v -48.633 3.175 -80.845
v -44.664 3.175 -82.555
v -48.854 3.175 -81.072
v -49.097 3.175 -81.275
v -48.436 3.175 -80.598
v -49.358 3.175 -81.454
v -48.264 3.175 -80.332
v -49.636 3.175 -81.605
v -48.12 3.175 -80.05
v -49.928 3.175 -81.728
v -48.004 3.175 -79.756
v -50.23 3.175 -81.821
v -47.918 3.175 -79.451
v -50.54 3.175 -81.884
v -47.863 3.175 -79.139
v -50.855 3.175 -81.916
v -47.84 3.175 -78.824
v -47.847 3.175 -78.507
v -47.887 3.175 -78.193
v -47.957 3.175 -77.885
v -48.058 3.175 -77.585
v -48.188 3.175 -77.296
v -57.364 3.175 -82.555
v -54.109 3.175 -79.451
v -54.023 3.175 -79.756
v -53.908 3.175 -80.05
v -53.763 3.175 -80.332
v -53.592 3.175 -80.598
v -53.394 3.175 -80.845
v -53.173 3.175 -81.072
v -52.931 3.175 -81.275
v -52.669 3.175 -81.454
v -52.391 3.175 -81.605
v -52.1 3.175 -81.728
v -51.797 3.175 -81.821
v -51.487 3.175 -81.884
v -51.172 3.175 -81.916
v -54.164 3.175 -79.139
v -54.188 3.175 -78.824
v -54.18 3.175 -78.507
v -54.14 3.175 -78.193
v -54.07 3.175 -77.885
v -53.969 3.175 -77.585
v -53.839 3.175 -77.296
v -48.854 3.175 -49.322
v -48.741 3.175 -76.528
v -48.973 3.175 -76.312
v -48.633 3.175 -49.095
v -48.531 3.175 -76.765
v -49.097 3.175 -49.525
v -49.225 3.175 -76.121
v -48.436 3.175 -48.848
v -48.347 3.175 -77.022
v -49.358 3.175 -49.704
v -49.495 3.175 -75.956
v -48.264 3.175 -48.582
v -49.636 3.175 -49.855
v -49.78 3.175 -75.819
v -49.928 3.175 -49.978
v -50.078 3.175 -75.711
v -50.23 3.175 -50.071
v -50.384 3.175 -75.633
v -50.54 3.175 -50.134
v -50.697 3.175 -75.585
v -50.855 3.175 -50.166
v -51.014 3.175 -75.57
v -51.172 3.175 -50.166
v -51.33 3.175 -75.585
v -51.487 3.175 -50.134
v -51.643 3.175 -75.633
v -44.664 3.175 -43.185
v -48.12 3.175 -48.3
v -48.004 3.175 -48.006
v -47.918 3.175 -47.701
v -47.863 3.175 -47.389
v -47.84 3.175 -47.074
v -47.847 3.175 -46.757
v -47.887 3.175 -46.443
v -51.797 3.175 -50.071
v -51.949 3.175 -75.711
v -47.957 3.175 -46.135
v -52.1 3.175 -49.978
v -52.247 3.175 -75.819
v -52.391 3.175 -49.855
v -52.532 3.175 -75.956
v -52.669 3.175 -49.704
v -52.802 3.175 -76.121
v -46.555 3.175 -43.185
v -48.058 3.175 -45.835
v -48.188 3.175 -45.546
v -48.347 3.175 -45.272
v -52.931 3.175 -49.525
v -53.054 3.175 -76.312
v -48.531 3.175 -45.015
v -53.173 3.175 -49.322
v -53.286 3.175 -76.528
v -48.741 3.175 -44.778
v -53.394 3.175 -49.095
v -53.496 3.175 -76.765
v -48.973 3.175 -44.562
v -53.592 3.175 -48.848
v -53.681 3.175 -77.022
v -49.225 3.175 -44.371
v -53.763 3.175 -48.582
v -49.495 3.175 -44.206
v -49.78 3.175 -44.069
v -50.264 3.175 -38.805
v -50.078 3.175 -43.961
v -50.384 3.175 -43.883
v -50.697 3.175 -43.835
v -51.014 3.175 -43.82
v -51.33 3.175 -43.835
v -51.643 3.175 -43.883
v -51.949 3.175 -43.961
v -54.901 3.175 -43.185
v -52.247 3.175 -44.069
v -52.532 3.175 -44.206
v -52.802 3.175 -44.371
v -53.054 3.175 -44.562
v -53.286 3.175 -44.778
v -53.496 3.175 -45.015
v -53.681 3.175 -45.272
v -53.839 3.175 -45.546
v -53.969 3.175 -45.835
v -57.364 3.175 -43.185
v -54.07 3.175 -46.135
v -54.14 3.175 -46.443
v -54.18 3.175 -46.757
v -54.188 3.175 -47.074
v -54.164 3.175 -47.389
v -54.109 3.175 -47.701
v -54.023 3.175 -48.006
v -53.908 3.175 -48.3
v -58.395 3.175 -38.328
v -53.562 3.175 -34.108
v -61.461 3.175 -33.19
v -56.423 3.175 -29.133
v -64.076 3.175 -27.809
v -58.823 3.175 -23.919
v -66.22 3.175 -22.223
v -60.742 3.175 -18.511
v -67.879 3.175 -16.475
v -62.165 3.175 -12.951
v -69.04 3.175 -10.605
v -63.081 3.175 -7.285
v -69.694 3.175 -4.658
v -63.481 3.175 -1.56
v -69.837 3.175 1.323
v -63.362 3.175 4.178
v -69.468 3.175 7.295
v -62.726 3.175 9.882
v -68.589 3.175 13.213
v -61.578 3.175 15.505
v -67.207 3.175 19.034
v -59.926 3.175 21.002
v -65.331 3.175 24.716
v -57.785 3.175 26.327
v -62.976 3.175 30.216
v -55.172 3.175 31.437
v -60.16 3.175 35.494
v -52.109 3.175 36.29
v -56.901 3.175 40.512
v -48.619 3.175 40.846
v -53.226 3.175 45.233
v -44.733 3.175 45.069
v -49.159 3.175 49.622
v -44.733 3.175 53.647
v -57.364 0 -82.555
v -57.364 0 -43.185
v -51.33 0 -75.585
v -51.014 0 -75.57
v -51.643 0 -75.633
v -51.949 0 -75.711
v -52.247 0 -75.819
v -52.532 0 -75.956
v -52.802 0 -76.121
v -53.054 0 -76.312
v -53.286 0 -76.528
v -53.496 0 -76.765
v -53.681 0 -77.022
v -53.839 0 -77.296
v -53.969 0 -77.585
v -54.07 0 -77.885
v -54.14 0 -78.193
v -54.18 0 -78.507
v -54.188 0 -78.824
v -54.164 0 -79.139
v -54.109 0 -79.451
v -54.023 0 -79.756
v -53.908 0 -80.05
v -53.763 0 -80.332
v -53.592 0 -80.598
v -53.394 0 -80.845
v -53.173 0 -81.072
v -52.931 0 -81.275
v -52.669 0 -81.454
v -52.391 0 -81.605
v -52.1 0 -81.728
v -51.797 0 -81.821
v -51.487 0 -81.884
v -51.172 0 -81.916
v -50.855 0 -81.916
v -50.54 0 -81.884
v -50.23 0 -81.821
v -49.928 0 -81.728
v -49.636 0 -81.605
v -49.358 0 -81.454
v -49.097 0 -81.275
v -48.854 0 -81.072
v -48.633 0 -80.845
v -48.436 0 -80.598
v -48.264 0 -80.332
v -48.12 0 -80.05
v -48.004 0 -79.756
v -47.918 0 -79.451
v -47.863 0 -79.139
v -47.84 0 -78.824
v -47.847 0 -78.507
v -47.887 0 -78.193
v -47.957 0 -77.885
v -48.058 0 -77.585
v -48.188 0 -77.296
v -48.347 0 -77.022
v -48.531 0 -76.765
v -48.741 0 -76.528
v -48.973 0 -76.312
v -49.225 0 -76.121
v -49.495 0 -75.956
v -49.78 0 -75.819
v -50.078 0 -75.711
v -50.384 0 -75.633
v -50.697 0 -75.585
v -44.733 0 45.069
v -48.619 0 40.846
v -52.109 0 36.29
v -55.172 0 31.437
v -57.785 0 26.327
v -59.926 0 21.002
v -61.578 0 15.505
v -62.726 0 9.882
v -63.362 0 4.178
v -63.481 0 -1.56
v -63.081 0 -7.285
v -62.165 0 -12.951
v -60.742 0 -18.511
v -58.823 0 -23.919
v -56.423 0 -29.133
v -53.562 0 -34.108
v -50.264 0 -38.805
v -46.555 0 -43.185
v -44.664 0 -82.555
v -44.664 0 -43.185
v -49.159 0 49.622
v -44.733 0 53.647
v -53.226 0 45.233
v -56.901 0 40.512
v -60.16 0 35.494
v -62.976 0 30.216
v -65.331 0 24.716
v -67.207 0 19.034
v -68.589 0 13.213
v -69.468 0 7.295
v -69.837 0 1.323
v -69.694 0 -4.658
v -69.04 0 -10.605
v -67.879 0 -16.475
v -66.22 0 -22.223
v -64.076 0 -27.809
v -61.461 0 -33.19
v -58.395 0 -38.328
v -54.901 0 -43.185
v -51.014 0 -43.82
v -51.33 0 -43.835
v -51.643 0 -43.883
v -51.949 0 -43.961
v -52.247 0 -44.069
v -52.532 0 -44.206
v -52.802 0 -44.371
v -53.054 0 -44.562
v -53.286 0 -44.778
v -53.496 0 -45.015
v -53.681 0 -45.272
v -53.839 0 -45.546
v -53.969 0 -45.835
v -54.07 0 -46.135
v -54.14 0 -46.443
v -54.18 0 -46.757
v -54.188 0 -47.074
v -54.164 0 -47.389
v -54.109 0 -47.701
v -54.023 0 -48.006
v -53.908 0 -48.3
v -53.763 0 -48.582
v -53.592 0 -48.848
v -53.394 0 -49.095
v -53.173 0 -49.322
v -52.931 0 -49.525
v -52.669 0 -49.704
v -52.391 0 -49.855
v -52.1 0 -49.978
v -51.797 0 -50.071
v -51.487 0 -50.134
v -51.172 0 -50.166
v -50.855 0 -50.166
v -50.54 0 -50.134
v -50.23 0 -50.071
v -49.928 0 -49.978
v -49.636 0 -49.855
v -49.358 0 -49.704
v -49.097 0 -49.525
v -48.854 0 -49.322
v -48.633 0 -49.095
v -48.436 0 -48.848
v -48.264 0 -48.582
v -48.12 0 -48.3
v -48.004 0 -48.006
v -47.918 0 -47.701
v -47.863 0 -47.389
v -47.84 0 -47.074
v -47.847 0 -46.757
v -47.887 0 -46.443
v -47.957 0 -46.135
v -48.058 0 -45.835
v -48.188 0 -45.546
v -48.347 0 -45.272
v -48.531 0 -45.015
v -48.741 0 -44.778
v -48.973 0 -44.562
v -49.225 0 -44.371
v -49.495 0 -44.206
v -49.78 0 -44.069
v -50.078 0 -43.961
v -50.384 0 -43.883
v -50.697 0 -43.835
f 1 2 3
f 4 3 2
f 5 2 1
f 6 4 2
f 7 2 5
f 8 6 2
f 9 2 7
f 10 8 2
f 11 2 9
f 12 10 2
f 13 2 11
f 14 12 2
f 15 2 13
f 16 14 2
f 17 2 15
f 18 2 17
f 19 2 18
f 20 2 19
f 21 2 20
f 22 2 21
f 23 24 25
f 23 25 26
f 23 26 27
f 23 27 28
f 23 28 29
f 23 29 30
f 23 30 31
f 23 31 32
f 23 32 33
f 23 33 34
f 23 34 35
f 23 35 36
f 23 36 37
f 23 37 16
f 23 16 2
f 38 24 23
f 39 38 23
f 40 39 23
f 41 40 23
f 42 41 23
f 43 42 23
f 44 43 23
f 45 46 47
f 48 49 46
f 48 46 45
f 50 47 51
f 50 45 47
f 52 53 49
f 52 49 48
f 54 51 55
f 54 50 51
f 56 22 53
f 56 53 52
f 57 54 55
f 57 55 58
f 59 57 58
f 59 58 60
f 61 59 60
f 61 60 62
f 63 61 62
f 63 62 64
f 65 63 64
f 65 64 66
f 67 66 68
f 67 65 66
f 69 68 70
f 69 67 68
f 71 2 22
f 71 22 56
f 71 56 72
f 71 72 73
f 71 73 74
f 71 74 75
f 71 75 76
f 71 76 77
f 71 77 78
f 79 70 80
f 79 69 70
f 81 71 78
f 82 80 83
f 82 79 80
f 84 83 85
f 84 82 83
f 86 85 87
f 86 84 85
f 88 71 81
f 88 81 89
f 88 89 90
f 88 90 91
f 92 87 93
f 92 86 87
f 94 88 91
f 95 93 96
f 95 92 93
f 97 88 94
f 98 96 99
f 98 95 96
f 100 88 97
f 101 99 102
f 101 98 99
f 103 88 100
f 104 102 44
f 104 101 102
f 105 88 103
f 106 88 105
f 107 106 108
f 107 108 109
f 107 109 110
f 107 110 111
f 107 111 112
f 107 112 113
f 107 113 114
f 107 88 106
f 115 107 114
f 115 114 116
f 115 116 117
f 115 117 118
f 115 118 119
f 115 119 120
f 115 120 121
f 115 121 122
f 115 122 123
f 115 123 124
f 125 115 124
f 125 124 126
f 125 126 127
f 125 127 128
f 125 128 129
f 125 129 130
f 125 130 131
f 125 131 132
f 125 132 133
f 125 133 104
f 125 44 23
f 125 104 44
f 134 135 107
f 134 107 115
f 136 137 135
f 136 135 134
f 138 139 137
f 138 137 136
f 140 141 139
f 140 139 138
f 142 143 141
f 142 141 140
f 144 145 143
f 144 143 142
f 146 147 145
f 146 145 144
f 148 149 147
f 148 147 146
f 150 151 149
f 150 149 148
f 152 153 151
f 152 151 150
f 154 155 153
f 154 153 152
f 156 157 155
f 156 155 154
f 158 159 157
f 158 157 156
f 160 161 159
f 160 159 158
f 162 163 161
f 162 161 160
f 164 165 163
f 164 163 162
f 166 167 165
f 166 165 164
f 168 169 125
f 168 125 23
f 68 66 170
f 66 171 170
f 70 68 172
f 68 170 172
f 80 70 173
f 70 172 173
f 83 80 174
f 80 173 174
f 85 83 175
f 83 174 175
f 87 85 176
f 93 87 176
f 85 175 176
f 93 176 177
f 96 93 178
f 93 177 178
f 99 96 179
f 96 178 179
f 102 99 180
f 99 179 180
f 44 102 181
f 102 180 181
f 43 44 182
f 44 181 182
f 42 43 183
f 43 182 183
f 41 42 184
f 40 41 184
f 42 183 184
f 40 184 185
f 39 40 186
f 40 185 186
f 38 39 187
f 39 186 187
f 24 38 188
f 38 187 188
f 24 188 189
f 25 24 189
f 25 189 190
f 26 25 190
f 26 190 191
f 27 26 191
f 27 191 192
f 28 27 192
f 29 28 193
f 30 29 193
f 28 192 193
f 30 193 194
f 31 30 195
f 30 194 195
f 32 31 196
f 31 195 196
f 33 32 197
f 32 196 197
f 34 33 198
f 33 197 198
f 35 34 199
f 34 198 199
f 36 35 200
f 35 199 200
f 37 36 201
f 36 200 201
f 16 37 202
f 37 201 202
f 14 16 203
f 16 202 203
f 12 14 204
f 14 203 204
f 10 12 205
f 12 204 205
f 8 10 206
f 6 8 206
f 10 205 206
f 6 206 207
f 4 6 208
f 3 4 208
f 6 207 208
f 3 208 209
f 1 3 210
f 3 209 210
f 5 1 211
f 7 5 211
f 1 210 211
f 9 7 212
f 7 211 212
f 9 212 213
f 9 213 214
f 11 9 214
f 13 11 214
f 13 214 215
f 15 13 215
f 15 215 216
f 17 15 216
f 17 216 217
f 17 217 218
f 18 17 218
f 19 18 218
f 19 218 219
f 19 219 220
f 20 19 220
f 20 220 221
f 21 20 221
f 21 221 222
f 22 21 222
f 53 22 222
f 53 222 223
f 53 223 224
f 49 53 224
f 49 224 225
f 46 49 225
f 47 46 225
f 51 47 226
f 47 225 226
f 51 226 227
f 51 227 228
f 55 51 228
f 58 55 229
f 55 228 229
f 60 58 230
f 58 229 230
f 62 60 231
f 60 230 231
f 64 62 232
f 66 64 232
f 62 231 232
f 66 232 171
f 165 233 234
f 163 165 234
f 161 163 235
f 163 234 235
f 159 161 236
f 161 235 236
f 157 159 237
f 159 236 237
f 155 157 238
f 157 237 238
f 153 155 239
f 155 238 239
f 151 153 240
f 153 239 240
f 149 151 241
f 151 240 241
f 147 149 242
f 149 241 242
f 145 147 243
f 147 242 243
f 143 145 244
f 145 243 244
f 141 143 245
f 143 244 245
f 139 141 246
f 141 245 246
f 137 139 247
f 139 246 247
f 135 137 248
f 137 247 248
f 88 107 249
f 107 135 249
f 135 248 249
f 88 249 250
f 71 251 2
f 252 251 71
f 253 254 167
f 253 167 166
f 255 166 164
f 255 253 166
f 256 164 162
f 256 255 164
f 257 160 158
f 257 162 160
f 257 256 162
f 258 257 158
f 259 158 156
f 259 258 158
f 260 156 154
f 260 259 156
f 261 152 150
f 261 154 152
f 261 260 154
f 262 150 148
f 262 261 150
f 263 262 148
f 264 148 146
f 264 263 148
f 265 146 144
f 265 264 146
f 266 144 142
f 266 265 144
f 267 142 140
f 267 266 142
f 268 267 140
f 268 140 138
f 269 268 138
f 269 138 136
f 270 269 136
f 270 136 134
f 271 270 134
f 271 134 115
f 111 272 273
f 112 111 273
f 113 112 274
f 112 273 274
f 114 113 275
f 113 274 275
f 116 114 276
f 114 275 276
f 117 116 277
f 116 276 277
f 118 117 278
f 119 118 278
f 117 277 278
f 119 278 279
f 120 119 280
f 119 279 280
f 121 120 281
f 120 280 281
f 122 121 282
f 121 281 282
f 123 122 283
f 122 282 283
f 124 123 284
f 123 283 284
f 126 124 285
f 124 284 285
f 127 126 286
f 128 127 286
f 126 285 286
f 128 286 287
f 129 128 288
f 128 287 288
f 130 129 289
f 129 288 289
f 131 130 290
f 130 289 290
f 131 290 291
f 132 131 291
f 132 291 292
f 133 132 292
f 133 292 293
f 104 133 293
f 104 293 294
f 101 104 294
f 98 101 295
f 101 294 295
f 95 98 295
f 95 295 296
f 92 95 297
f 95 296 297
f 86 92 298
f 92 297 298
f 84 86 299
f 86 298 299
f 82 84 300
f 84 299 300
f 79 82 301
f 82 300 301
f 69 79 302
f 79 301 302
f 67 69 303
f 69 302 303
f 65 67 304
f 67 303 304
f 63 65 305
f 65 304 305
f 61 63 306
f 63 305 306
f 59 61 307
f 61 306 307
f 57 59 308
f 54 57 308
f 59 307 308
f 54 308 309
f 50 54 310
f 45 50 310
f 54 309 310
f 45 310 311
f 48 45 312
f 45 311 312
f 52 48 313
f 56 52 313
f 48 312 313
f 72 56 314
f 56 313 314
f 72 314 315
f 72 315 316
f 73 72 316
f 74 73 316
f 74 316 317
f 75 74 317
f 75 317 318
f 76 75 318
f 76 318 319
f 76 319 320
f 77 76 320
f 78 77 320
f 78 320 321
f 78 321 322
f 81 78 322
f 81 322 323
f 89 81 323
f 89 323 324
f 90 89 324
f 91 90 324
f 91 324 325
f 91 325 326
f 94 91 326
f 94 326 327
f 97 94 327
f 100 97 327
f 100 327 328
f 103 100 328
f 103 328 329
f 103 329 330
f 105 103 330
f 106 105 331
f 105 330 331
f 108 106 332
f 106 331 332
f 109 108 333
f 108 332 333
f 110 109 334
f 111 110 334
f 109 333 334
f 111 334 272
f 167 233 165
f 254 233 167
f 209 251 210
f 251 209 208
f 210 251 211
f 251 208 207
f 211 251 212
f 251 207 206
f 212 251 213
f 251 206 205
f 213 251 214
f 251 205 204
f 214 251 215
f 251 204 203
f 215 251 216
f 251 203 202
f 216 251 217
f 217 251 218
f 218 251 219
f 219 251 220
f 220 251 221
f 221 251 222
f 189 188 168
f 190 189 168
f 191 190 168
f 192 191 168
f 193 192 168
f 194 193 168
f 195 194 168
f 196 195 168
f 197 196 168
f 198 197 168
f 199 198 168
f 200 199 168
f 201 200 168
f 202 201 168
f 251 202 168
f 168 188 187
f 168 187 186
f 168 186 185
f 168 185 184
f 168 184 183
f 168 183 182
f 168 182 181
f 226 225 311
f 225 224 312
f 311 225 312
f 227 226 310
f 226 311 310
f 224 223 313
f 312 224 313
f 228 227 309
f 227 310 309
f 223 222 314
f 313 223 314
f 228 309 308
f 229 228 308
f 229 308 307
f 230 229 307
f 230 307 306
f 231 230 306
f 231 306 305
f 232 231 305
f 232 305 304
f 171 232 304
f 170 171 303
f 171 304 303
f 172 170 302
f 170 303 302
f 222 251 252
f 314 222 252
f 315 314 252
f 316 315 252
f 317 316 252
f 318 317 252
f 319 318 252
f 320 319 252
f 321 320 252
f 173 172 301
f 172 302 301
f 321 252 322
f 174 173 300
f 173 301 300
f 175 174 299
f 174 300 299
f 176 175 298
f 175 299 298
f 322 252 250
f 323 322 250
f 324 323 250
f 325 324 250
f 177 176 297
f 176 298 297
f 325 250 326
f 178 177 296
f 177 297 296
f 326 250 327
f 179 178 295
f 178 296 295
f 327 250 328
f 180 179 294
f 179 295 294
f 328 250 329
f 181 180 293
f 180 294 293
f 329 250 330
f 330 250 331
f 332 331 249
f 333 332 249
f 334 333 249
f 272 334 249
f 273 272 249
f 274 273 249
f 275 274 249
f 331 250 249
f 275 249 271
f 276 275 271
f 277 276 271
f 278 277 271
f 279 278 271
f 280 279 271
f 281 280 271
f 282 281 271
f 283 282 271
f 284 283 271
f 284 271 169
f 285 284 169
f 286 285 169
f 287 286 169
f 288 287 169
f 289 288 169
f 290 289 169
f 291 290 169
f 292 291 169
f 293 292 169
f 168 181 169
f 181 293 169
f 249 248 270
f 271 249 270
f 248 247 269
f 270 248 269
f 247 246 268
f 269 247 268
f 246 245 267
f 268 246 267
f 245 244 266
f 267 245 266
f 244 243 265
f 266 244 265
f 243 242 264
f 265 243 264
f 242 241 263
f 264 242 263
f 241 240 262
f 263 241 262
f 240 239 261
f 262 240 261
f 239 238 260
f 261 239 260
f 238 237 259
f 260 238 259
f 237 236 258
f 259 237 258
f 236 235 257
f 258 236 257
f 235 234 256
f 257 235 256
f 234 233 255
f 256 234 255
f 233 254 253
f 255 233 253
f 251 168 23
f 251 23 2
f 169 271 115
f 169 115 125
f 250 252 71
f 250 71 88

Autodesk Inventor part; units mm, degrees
ref_plane "YZ Plane" through (0, 0, 0) normal (1, 0, 0) x (0, 1, 0)
ref_plane "XZ Plane" through (0, 0, 0) normal (0, 1, 0) x (-1, 0, 0)
ref_plane "XY Plane" through (0, 0, 0) normal (0, 0, 1) x (1, 0, 0)
sketch "Sketch1" plane through (0, 0, 0) normal (0, 1, 0) x (-1, 0, 0)
  arc A0 (44.7326, -45.0693) -> (44.7326, 45.0693) centre (0, 0) ccw
  line L0 (44.6636, -43.1846) -> (57.3636, -43.1846)
  line L1 (57.3636, -43.1846) -> (57.3636, -82.5546)
  line L2 (57.3636, -82.5546) -> (44.6636, -82.5546)
  line L3 (44.6636, -82.5546) -> (44.6636, -43.1846)
  line L4 (44.7326, -53.6471) -> (44.7326, 53.6471)
  arc A1 (44.7326, -53.6471) -> (44.7326, 53.6471) centre (0, 0) ccw
  point P0 (54.901, -43.1846)
  point P1 (46.5547, -43.1846)
  dimension "d0" = 63.5
  dimension "d2" = 12.7
  dimension "d3" = 39.37
extrude "Extrusion1" add sketch "Sketch1" along normal blind 3.175 contours L4 L0 A0 | A0 L0 A1 L4 | L4 A1 L0 L1 L2 L3 | A0 L4 A1 L0 picked at (44.9379, -44.2344)
sketch "Sketch2" plane through (0, 3.175, 0) normal (0, 1, 0) x (1, 0, 0)
  line L0 (-57.3636, 82.5546) -> (-57.3636, 43.1846) projected
  line L1 (-44.6636, 82.5546) -> (-57.3636, 82.5546) projected
  line L2 (-46.5547, 43.1846) -> (-44.6636, 43.1846) projected
  line L3 (-44.6636, 43.1846) -> (-44.6636, 82.5546) projected
  line L4 (-57.3636, 43.1846) -> (-54.901, 43.1846) projected
  arc A0 (-54.901, 43.1846) -> (-44.7326, -53.6471) centre (0, 0) ccw projected
  line L5 (-44.7326, -53.6471) -> (-44.7326, -45.0693) projected
  arc A1 (-46.5547, 43.1846) -> (-44.7326, -45.0693) centre (0, 0) ccw projected
  point P0 (-51.0136, 46.9946)
  point P1 (-51.0136, 78.7446)
  dimension "d6" = 12.7
  dimension "d7" = 6.35
  dimension "d8" = 6.35
  dimension "d9" = 31.75
  dimension "d10" = 39.37
  dimension "d11" = 3.81
hole "Hole1" at (-51.0136, 3.175, -46.9946) at (-51.0136, 3.175, -78.7446) direction (0, -1, 0) diameter 6.35 depth 19.05 tip angle 118
equation "\"d7\" = 0.5 * d6"
equation "\"d8\" = d7"
equation "\"d11\" = -0.5 * d9 + 0.5 * d10"
properties part number "grabber"
